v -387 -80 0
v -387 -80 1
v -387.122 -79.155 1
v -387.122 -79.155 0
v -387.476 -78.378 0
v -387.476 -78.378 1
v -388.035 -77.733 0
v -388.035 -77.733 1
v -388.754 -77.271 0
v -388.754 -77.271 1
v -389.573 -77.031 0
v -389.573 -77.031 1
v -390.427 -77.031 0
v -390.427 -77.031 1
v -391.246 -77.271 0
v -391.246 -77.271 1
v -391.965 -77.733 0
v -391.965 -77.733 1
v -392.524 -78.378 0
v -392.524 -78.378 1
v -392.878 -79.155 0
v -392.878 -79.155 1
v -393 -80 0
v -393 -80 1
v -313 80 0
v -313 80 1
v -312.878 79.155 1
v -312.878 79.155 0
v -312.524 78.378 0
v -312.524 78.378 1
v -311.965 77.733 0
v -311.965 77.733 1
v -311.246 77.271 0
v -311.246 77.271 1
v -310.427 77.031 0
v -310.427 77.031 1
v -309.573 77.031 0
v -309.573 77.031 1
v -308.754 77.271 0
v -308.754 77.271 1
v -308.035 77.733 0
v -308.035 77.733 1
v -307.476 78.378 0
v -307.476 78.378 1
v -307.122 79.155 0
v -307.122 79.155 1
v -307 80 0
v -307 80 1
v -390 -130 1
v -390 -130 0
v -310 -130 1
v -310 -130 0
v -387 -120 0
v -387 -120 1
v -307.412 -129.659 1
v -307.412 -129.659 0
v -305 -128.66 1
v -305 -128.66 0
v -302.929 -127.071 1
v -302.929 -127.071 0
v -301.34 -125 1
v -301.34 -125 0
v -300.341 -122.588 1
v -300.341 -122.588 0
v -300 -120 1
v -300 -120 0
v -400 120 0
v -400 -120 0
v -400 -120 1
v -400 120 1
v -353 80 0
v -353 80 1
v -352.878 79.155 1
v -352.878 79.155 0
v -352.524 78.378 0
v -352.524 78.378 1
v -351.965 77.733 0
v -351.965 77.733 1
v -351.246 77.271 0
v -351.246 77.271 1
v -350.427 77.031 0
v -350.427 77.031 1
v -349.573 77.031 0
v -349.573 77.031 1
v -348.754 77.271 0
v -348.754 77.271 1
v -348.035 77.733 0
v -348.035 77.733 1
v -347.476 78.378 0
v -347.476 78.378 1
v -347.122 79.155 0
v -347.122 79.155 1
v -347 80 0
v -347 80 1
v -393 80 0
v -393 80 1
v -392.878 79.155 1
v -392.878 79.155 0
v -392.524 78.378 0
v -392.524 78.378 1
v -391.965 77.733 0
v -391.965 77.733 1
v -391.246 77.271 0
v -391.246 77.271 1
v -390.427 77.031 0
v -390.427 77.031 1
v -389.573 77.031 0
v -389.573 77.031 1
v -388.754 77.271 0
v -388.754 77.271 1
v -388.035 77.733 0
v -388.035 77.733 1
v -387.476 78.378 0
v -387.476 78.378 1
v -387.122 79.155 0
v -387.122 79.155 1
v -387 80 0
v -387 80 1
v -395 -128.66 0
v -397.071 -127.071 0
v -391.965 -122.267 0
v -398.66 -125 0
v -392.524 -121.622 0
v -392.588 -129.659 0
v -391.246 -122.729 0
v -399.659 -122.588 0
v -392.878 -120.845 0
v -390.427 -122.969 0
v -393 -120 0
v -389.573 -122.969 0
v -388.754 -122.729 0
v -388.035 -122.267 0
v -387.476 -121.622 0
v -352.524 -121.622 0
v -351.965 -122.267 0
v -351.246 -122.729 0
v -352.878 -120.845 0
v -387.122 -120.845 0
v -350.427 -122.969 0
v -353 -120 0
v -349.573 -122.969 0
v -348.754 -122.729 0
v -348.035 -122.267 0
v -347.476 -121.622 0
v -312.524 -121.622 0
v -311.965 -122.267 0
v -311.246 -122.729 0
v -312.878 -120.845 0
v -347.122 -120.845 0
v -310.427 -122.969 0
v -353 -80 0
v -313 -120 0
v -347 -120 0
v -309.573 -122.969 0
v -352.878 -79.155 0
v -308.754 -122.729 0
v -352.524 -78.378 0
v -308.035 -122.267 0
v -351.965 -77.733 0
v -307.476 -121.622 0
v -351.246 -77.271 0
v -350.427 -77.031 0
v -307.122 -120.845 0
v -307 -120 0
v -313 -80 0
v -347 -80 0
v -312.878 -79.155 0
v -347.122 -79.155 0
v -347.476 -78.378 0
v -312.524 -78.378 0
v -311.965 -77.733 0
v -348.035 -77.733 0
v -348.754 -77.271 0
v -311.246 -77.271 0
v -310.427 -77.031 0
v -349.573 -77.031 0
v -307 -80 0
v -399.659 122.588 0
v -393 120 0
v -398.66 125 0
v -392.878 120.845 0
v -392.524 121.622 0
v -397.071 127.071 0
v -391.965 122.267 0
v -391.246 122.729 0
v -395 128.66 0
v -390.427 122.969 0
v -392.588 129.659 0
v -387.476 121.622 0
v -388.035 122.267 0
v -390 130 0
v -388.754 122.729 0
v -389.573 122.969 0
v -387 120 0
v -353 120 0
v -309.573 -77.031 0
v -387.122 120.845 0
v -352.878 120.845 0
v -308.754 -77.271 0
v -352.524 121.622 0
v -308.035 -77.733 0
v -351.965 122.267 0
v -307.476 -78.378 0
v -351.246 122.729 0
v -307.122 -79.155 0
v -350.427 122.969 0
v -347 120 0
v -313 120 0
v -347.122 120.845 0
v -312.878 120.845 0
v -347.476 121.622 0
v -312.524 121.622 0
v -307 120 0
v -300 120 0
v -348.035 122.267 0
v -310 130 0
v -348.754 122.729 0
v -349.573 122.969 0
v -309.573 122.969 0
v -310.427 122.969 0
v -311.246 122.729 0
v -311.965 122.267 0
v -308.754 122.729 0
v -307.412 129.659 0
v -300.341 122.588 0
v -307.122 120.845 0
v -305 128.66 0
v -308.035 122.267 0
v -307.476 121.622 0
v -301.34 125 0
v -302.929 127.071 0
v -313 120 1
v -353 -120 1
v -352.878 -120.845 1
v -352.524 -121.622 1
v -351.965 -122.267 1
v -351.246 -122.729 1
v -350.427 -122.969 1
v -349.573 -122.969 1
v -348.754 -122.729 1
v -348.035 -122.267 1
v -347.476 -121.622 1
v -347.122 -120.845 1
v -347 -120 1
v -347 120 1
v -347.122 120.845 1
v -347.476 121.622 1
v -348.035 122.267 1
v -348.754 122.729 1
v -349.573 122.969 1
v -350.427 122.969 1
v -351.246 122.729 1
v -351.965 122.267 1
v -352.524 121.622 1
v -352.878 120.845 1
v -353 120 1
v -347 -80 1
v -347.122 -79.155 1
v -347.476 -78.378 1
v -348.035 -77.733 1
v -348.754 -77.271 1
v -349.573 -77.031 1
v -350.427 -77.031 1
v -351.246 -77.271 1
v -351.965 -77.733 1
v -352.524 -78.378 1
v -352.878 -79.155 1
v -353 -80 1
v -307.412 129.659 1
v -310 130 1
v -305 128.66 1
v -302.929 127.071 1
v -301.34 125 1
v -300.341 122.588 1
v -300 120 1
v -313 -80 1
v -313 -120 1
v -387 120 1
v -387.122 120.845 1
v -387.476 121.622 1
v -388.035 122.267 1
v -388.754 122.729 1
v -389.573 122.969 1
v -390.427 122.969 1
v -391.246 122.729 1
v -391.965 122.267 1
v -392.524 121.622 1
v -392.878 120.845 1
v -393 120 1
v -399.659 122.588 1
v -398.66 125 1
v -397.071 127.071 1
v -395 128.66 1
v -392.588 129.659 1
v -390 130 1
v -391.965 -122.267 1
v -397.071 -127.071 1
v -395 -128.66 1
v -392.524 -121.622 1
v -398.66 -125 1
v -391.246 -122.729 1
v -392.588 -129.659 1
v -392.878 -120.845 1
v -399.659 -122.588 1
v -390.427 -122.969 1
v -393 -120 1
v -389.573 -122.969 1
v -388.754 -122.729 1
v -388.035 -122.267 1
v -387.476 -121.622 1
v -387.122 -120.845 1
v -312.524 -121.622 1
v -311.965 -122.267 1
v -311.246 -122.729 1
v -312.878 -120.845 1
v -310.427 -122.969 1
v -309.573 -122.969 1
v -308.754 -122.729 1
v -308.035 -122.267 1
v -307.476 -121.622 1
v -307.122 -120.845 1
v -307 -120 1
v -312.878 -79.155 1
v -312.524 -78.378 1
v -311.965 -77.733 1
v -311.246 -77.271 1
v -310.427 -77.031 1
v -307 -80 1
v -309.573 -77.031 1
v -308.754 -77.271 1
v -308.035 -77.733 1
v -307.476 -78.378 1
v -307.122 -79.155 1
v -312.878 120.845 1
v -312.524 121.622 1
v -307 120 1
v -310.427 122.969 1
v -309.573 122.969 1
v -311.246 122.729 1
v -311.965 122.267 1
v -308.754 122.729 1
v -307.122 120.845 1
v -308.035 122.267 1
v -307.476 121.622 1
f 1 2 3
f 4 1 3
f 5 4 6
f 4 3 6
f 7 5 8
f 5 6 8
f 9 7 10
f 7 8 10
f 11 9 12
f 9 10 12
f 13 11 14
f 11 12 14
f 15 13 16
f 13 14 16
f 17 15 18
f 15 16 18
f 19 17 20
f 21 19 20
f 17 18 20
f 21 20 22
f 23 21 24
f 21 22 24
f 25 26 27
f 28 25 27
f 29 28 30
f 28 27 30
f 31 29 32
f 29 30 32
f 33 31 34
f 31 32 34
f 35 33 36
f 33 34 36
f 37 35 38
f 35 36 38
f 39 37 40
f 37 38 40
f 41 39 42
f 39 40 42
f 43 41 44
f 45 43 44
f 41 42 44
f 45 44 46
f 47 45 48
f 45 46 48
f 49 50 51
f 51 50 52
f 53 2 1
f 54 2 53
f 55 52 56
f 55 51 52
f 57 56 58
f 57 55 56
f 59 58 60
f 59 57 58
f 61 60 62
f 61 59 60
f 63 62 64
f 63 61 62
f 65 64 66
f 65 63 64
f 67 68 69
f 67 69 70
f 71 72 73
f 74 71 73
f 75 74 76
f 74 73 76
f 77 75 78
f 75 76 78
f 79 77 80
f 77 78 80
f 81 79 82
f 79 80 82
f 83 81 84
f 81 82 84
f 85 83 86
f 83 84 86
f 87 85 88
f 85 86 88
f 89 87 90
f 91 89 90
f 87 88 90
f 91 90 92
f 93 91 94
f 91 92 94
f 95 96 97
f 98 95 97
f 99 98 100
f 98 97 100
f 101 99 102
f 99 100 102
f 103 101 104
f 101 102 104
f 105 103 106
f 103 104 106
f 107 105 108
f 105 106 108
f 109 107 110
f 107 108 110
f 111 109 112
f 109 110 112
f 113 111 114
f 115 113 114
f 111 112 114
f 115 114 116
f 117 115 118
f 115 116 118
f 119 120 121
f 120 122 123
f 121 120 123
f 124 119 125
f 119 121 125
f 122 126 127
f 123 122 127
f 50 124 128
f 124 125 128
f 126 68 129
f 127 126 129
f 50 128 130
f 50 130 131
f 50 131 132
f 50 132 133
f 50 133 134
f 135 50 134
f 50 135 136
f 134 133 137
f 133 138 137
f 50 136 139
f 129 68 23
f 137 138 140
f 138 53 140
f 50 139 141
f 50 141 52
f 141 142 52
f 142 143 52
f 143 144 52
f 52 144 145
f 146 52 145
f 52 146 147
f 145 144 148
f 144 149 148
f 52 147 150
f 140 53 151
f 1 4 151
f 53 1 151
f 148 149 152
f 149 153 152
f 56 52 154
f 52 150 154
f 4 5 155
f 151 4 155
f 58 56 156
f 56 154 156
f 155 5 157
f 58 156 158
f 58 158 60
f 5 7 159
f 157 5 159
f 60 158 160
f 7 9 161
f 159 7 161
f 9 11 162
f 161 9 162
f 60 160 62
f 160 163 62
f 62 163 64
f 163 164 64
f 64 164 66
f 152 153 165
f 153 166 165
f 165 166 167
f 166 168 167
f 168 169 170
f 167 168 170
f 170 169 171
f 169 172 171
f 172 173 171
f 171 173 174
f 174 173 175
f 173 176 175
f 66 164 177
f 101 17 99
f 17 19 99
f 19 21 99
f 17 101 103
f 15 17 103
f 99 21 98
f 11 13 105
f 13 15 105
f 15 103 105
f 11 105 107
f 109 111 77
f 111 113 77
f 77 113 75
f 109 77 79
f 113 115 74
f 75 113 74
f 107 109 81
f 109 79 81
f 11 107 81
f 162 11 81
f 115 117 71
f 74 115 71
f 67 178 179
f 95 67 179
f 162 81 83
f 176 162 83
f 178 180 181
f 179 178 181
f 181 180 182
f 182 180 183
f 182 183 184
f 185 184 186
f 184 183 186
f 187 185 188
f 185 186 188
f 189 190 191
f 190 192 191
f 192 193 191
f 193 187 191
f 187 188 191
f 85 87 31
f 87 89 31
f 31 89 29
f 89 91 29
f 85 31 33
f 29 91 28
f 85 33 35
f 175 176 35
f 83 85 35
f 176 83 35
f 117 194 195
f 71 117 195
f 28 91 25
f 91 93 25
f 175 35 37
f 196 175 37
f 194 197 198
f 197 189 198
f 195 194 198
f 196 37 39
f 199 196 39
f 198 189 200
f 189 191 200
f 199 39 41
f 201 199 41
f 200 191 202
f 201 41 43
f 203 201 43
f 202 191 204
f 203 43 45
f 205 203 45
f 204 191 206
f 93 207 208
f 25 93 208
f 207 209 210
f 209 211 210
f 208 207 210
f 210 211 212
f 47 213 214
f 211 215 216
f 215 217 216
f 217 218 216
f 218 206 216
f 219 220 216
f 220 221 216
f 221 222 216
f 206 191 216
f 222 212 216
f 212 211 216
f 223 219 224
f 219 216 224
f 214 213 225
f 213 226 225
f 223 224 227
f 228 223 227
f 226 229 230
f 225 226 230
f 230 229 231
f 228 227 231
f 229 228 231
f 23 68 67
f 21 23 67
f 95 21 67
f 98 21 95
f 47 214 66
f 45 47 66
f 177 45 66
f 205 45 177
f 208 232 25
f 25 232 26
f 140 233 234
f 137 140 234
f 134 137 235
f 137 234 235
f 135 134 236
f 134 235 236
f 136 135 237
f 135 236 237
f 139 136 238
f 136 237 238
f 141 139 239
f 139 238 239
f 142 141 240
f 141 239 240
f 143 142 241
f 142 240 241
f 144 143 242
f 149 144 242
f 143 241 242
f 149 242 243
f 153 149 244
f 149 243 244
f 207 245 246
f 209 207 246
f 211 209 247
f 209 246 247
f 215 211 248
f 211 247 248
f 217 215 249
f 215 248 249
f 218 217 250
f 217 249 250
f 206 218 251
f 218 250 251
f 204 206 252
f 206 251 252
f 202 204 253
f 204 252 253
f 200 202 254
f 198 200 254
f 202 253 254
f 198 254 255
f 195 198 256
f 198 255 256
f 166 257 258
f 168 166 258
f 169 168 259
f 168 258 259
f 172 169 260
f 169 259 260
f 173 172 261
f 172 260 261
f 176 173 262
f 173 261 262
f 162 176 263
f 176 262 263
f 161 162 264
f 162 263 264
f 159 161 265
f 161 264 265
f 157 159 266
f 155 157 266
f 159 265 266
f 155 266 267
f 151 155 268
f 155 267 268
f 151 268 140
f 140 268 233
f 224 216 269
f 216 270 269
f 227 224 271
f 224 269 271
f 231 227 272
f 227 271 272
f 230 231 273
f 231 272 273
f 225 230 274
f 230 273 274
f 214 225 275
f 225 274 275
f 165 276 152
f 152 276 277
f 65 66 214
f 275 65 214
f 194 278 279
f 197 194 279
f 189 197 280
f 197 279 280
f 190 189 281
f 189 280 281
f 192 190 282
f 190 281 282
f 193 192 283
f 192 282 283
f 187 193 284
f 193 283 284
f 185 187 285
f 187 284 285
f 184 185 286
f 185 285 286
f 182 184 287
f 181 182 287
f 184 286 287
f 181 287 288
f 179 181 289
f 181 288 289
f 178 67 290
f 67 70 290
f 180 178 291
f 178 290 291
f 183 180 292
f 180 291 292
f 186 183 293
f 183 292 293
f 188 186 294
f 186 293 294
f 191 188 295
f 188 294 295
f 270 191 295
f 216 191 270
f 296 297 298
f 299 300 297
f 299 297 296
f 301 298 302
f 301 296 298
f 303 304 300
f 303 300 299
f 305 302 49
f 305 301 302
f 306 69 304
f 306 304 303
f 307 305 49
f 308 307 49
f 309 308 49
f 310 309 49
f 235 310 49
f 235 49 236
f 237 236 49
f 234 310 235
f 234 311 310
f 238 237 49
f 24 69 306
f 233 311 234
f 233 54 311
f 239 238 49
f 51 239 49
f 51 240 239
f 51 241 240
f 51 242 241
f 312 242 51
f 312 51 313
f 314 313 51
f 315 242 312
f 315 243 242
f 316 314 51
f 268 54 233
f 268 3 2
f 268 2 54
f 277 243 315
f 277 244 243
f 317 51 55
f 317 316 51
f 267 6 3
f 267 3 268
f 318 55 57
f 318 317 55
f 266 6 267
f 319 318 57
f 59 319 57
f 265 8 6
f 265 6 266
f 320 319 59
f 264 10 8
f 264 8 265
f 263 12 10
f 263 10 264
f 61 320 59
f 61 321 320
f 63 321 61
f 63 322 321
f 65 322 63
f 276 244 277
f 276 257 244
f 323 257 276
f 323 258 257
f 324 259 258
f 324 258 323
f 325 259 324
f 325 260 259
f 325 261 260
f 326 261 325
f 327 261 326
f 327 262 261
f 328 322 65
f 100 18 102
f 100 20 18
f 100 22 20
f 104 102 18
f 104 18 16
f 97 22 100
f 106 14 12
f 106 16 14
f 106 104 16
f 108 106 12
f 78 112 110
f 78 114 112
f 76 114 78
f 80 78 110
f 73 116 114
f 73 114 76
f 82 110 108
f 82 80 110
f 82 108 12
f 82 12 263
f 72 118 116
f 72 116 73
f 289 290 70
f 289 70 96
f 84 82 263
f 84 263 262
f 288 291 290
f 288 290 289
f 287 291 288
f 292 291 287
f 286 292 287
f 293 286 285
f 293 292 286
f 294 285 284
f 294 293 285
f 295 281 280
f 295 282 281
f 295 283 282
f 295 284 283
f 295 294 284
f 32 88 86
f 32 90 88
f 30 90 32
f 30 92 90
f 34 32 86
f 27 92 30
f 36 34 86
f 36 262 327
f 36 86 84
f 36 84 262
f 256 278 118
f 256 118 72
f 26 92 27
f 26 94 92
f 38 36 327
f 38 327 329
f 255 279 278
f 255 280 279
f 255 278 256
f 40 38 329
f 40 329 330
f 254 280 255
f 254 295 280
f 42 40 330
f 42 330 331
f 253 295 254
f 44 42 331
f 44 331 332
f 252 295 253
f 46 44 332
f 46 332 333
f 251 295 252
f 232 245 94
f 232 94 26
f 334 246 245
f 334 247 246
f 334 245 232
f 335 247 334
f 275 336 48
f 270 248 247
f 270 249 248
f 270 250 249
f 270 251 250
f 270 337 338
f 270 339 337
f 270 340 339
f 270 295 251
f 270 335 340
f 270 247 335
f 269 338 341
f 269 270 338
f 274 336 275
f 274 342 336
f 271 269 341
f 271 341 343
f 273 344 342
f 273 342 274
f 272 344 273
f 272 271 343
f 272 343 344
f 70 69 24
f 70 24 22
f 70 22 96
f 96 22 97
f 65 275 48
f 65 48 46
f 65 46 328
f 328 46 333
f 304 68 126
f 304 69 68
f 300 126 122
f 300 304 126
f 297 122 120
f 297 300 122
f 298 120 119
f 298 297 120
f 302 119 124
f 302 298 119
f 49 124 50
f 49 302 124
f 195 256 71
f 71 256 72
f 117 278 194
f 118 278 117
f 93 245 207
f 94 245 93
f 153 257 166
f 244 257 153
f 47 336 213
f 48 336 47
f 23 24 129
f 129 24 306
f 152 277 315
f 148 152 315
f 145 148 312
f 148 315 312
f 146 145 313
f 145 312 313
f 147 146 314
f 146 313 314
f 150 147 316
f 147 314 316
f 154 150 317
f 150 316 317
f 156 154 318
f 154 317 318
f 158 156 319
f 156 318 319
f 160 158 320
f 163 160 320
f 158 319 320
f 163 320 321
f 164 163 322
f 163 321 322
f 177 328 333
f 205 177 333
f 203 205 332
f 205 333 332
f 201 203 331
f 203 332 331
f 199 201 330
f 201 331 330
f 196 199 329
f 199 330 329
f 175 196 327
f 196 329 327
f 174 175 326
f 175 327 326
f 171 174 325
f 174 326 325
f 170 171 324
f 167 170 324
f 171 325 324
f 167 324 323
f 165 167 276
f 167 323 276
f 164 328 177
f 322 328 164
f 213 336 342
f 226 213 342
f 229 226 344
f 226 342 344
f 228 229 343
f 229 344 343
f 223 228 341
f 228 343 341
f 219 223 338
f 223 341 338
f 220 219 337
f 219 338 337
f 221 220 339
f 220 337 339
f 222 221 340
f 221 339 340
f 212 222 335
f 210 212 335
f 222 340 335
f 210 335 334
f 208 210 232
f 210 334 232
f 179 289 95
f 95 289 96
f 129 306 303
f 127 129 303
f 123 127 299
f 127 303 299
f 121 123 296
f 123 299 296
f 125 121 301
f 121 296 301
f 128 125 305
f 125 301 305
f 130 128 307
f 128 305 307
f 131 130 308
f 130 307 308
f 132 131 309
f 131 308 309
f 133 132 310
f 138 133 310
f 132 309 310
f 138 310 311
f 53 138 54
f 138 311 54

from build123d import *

# Parameters (mm, degrees)
SKETCH006_W     = 100
SKETCH006_H     = 260
PAD001_DEPTH    = 1
POCKET005_DEPTH = 5
FILLET_R        = 10


with BuildPart() as part:
    # Sketch006 → Pad001 (new body)
    with BuildSketch(Plane.XY):
        with Locations((-350, 0)):
            Rectangle(SKETCH006_W, SKETCH006_H)
    extrude(amount=PAD001_DEPTH)

    # Sketch007 (on Face6 of Pad001) → Pocket005 (cut)
    with BuildSketch(Plane.XY.offset(1)):
        with BuildLine():
            ThreePointArc((-347, -80), (-350, -77), (-353, -80))
            Line((-353, -80), (-353, -120))
            ThreePointArc((-353, -120), (-350, -123), (-347, -120))
            Line((-347, -80), (-347, -120))
        make_face()
        with BuildLine():
            ThreePointArc((-387, -80), (-390, -77), (-393, -80))
            Line((-393, -80), (-393, -120))
            ThreePointArc((-393, -120), (-390, -123), (-387, -120))
            Line((-387, -80), (-387, -120))
        make_face()
        with BuildLine():
            ThreePointArc((-307, -80), (-310, -77), (-313, -80))
            Line((-313, -80), (-313, -120))
            ThreePointArc((-313, -120), (-310, -123), (-307, -120))
            Line((-307, -80), (-307, -120))
        make_face()
        with BuildLine():
            ThreePointArc((-347, 120), (-350, 123), (-353, 120))
            Line((-353, 120), (-353, 80))
            ThreePointArc((-353, 80), (-350, 77), (-347, 80))
            Line((-347, 120), (-347, 80))
        make_face()
        with BuildLine():
            ThreePointArc((-387, 120), (-390, 123), (-393, 120))
            Line((-393, 120), (-393, 80))
            ThreePointArc((-393, 80), (-390, 77), (-387, 80))
            Line((-387, 120), (-387, 80))
        make_face()
        with BuildLine():
            ThreePointArc((-307, 120), (-310, 123), (-313, 120))
            Line((-313, 120), (-313, 80))
            ThreePointArc((-313, 80), (-310, 77), (-307, 80))
            Line((-307, 120), (-307, 80))
        make_face()
    extrude(amount=-POCKET005_DEPTH, mode=Mode.SUBTRACT)

    # Fillet
    fillet_edges = [part.edges().sort_by_distance(p)[0] for p in [
        (-400, 130, 0.5),
        (-400, -130, 0.5),
        (-300, -130, 0.5),
        (-300, 130, 0.5),
    ]]
    fillet(fillet_edges, radius=FILLET_R)


solid = part.part
